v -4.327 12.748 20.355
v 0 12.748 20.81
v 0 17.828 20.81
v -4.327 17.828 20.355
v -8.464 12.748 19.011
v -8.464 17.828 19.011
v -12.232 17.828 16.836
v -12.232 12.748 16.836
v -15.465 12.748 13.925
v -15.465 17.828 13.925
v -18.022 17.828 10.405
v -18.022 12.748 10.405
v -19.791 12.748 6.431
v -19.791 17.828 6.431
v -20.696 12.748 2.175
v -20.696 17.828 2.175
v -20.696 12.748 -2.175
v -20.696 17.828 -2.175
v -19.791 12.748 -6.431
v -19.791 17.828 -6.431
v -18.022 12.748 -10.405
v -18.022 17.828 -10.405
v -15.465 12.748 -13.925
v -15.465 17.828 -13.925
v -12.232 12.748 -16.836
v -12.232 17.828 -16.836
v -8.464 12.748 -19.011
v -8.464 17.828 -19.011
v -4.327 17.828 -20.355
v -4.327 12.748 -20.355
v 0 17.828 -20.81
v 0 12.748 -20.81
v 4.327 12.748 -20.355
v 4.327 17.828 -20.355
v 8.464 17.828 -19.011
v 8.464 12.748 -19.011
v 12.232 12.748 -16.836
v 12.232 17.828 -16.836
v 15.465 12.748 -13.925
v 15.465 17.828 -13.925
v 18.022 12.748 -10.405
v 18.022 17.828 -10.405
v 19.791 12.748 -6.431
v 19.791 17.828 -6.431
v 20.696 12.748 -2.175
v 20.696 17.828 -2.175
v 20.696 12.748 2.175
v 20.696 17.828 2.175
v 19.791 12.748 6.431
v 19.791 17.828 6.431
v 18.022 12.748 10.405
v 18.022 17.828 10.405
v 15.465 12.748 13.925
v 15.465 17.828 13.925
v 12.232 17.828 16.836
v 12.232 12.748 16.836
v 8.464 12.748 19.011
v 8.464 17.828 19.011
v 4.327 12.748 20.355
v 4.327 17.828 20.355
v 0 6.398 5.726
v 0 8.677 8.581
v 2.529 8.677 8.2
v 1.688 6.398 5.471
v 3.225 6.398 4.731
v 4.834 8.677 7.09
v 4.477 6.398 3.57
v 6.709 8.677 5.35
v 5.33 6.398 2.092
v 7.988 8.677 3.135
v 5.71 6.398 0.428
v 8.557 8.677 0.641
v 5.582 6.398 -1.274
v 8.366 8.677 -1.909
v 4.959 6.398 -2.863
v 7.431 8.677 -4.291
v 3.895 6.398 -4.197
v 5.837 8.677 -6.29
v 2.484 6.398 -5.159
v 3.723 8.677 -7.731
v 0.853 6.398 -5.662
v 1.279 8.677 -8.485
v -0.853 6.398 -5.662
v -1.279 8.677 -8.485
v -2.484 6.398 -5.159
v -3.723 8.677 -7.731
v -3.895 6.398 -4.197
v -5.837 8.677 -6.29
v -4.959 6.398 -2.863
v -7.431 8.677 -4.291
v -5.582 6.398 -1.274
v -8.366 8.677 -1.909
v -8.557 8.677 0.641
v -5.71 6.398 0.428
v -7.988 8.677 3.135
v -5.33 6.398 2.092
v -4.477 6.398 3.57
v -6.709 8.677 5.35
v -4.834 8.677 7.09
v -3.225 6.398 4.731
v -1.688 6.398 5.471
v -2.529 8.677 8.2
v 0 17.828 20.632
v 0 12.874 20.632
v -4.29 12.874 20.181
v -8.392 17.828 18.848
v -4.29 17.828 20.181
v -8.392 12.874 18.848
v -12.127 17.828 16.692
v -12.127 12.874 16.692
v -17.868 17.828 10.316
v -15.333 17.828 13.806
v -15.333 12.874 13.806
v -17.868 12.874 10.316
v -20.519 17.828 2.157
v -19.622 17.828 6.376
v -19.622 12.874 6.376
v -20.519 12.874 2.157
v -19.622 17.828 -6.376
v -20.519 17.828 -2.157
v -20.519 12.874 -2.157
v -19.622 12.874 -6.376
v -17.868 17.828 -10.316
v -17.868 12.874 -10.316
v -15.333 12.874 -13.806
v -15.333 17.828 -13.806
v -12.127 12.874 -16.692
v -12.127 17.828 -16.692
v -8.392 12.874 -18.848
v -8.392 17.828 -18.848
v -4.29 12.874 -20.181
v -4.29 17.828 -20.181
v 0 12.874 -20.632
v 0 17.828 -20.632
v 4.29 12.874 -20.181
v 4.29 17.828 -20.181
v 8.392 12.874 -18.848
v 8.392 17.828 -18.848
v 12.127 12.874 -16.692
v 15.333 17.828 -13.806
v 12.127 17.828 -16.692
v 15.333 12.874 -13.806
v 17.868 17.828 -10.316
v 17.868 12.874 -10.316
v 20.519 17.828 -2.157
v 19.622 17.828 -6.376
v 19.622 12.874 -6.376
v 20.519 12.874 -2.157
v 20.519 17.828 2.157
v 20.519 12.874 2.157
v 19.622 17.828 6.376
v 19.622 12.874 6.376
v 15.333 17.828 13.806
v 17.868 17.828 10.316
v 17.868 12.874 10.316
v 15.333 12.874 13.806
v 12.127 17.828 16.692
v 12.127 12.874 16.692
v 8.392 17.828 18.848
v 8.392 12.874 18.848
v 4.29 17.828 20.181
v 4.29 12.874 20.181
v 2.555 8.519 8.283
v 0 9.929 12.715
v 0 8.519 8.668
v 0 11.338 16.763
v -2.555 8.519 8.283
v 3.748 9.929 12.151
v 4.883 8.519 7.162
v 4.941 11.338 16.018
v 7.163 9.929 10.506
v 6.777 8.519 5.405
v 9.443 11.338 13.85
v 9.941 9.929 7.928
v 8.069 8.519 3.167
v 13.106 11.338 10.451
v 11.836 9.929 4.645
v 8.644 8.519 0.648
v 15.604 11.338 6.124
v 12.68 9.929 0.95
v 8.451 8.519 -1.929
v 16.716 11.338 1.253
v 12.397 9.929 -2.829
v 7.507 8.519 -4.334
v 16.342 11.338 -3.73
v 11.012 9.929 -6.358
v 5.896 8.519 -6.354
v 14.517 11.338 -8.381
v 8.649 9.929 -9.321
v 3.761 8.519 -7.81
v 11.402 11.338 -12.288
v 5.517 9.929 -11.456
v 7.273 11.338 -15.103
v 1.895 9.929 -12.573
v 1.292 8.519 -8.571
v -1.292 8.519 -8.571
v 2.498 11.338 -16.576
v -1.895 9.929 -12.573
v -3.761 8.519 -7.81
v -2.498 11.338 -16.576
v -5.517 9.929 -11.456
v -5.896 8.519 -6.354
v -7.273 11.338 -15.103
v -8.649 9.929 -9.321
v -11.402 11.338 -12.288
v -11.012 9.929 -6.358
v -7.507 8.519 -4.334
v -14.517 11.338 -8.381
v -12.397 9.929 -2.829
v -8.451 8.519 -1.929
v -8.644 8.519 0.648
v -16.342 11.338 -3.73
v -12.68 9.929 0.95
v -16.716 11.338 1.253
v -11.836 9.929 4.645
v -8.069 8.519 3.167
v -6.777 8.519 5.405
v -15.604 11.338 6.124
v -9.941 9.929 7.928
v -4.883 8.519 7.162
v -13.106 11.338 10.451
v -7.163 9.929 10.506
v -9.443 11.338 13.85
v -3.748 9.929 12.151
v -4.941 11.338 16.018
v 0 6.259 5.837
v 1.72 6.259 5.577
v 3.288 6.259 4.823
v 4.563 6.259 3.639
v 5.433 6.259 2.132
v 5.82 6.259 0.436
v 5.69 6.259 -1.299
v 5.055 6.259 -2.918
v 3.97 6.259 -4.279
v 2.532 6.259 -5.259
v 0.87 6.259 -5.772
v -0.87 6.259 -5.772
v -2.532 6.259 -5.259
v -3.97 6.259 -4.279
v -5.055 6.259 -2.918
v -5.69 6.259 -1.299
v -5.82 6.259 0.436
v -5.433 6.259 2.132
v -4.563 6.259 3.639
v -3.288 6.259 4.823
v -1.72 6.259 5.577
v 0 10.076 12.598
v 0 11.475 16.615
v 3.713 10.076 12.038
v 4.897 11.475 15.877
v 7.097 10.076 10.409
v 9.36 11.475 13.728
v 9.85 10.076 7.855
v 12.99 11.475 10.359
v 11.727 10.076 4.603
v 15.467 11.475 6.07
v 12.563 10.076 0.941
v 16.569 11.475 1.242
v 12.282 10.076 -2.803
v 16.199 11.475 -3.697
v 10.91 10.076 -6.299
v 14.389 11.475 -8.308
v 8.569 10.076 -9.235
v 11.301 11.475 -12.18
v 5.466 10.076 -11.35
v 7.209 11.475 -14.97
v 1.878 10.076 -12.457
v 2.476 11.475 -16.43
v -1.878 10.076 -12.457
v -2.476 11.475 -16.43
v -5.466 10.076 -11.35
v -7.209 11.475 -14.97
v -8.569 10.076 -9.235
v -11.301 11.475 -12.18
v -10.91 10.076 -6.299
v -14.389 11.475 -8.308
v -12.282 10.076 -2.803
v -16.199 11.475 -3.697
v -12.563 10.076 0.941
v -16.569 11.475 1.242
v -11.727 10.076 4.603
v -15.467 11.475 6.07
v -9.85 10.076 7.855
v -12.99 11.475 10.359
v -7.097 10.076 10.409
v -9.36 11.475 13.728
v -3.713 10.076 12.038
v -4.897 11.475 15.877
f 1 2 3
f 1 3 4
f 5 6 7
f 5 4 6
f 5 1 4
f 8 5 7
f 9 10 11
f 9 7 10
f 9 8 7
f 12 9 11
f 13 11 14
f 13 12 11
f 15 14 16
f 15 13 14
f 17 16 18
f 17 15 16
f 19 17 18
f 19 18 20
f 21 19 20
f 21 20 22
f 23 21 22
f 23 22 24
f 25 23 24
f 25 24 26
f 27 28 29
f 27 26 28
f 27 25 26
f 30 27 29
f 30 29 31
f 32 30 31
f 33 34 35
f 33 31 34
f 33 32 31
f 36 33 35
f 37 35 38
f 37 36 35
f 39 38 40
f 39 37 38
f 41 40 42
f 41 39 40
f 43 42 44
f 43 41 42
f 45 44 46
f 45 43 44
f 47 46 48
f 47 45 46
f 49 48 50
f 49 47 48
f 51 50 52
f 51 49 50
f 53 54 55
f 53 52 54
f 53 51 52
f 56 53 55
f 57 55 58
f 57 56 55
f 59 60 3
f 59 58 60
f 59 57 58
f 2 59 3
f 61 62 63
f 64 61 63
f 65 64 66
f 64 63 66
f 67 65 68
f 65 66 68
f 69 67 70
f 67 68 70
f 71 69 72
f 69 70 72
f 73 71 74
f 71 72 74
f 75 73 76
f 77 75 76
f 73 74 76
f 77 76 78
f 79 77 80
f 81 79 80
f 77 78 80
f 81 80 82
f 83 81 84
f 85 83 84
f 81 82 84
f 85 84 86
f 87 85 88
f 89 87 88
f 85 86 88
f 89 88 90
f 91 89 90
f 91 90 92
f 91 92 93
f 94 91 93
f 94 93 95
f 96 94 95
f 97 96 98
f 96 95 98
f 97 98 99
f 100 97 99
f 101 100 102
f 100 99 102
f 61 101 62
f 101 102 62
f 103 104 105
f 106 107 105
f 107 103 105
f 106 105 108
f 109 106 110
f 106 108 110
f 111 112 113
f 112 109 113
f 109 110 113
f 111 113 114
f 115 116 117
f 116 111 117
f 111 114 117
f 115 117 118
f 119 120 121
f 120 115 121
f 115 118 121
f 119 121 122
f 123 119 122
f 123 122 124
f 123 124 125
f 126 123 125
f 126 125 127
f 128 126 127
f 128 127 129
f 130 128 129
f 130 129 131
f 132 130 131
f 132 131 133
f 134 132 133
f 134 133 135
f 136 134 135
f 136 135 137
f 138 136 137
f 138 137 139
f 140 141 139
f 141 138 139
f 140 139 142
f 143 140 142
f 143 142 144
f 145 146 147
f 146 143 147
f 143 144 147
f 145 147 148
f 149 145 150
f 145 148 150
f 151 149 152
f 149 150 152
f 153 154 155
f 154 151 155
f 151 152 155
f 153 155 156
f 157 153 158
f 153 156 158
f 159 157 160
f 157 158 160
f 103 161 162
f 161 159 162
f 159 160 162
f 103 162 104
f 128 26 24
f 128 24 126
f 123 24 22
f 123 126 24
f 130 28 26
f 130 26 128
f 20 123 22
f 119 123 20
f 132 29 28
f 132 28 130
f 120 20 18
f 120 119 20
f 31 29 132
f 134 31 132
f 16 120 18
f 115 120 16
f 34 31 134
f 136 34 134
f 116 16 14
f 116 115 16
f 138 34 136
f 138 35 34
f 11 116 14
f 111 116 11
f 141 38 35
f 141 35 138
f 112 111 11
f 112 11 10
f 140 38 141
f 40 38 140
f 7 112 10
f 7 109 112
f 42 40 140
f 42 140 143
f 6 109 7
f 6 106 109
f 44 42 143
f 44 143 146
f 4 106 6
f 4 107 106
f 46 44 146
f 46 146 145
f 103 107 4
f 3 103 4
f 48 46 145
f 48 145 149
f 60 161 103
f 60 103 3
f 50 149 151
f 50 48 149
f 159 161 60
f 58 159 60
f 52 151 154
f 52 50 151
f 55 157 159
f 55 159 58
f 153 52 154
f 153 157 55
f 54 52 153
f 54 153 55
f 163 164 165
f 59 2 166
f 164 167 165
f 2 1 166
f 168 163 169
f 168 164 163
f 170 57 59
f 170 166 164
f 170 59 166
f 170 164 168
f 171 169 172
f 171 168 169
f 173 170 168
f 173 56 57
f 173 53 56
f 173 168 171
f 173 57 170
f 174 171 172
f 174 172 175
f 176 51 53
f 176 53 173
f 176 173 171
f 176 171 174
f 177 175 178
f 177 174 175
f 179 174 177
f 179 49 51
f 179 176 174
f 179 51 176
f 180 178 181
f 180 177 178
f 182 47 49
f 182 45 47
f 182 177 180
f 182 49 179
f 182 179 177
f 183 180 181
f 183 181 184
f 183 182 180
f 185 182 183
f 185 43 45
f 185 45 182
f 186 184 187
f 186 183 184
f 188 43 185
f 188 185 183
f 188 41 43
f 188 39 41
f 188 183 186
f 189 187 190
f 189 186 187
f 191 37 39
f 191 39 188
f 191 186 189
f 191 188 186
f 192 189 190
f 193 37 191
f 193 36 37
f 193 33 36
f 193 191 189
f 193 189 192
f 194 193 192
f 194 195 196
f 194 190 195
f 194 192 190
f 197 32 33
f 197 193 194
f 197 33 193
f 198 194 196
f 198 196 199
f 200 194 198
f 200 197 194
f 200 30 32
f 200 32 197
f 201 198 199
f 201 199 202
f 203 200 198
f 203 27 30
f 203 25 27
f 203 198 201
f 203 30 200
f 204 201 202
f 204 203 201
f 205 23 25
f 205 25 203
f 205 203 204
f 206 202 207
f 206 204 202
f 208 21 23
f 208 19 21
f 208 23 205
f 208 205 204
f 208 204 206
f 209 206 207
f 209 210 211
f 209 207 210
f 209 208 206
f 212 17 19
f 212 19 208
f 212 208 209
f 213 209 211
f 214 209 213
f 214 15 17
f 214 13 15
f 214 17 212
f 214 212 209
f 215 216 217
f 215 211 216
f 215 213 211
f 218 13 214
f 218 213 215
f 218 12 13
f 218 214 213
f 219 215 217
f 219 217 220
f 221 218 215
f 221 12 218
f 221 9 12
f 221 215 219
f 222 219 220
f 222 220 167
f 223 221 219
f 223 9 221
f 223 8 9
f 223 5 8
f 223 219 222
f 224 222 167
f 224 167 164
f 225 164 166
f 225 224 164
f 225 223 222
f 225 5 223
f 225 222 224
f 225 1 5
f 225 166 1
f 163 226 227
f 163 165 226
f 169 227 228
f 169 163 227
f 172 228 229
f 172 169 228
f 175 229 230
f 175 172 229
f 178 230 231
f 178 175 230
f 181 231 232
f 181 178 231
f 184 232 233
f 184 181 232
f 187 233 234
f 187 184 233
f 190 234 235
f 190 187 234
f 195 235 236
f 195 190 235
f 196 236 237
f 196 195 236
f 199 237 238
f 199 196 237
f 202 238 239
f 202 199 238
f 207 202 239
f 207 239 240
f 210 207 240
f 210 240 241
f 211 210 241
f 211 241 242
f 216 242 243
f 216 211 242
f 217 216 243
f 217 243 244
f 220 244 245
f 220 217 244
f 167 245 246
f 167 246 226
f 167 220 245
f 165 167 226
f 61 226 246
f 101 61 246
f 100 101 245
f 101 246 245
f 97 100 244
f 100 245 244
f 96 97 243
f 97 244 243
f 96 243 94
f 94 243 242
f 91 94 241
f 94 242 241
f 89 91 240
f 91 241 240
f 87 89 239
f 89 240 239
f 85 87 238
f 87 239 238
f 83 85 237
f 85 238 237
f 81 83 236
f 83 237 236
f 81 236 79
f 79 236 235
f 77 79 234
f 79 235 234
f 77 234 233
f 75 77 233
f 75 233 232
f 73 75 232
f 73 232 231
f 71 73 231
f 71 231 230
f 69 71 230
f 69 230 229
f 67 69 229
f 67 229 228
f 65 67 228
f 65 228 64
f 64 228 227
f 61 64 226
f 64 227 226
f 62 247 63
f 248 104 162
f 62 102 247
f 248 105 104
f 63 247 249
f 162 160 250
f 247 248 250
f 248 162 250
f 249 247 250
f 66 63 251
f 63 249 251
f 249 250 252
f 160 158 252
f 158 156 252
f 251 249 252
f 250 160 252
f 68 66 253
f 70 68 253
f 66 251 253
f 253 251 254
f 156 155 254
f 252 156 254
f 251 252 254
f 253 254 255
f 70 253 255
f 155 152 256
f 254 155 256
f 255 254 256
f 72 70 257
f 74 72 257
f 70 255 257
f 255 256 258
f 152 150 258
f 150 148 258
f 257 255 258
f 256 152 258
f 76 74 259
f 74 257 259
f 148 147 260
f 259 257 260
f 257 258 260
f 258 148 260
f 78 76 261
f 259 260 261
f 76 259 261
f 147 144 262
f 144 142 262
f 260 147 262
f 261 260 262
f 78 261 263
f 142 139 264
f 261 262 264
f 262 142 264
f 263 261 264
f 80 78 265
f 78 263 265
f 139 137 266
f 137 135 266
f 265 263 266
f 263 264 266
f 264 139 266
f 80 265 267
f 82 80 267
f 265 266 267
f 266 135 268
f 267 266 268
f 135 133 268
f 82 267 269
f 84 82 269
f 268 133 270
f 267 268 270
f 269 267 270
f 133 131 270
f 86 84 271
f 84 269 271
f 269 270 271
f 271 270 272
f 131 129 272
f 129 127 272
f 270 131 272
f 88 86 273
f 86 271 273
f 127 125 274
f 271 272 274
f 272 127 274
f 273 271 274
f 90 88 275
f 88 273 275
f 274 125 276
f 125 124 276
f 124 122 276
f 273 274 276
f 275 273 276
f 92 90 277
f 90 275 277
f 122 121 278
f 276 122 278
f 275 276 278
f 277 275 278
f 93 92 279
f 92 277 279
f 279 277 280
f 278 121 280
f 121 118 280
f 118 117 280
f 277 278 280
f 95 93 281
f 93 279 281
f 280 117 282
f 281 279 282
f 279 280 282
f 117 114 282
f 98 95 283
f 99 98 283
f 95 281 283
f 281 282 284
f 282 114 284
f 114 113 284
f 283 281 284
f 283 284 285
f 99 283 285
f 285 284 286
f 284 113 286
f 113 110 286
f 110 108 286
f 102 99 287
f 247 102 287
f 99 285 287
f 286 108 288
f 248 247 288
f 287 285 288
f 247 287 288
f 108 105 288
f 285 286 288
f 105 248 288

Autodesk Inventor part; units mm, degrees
ref_plane "YZ Plane" through (0, 0, 0) normal (1, 0, 0) x (0, 1, 0)
ref_plane "XZ Plane" through (0, 0, 0) normal (0, 1, 0) x (-1, 0, 0)
ref_plane "XY Plane" through (0, 0, 0) normal (0, 0, 1) x (1, 0, 0)
sketch "Sketch1" plane through (0, 0, 0) normal (1, 0, 0) x (0, 1, 0)
  line L0 (-5.1799, 0) -> (31.0792, 0) construction
  line L1 (0, -33.1988) -> (0, 40.25) construction
  line L2 (0, 0) -> (13, 9.7962) construction
  line L3 (0, 0) -> (13, -9.7962) construction
  line L4 (3.35, 2.6) -> (0.75, 2.6) construction
  line L5 (0.75, 2.6) -> (0.75, -2.6) construction
  line L6 (0.75, -2.6) -> (3.35, -2.6) construction
  line L7 (3.35, -2.6) -> (3.35, 2.6) construction
  line L8 (4.874, 11.4005) -> (4.874, -12.8161) construction
  line L9 (7.922, 11.2583) -> (7.922, -12.1988) construction
  circle A0 centre (6.398, 25.4) radius 3.175 construction
  line L10 (12.748, 29.7573) -> (12.748, -6.0773) construction
  line L11 (13, -8.155) -> (13, 15.6322) construction
  line L12 (12.748, 20.81) -> (8.422, 8.3886)
  line L13 (13, 11.8384) -> (4.874, 5.715) construction
  line L14 (12.9363, 20.81) -> (12.8744, 20.6322) construction
  line L15 (12.748, 20.81) -> (21.6933, 20.81) construction
  line L16 (12.9363, 20.81) -> (12.748, 20.81)
  line L17 (8.6773, 8.581) -> (8.422, 8.3886)
  line L18 (0, 3.81) -> (0, -3.81) construction
  line L19 (0, 3.81) -> (13, 13.6062) construction
  line L20 (13, 15.6322) -> (25.8994, 15.6322) construction
  line L21 (17.828, 20.81) -> (17.828, 20.6322)
  line L22 (17.828, 20.6322) -> (12.8744, 20.6322)
  line L23 (17.828, 20.81) -> (12.9363, 20.81)
  line L24 (12.8744, 20.6322) -> (8.6773, 8.581)
  line L25 (4.874, 5.715) -> (7.922, 8.763) construction
  line L26 (5, -22.7061) -> (5, -16.8713)
  line L27 (8.422, 8.3886) -> (8.422, 7.251) construction
  line L28 (8.422, 7.251) -> (3.35, 3.429) construction
  line L29 (6.398, 5.7258) -> (12.748, 13.6802) construction
  dimension "d0" = 37
  dimension "d1" = 13
  dimension "d2" = 2.6
  dimension "d3" = 5.2
  dimension "d4" = 0.75
  dimension "d5" = 1.524
  dimension "d6" = 3.048
  dimension "d7" = 6.35
  dimension "d8" = 1.524
  dimension "d9" = 25.4
  dimension "d10" = 3.175
  dimension "cone1_major_rad" = 20.81
  dimension "d13" = 0.5
  dimension "d15" = 5.715
  dimension "d17" = 0.1778
  dimension "d19" = 7.62
  dimension "d21" = 5.1778
  dimension "d22" = 0.1778
  dimension "ring_hieght" = 5.08
  dimension "cone1_minor_rad" = 8.3886
  dimension "cone1_height" = 4.326
  dimension "d26" = 45
  dimension "d27" = 5
  dimension "d29" = 2.286
  dimension "d30" = 7.251
  dimension "d31" = 13.6802
  dimension "cone2_minor_rad" = 5.7258
  dimension "d33" = 6.35
  dimension "d34" = 8.581
  dimension "cone2_hieght" = 2.024
revolve "Revolution1" add sketch "Sketch1" angle 360 about axis through (0, -10, 0) along (0, 1, 0)
sketch "Sketch2" plane through (0, 0, 0) normal (1, 0, 0) x (0, 1, 0)
  line L0 (8.6773, 8.581) -> (8.422, 8.3886) projected
  line L1 (0, 0) -> (13, 9.7962) construction
  line L2 (8.422, 8.3886) -> (8.422, 6.3464)
  line L3 (8.6773, 8.581) -> (8.6773, 6.5388)
  line L4 (8.422, 6.3464) -> (8.6773, 6.5388)
  line L5 (-5.1799, 0) -> (31.0792, 0) construction
revolve "Revolution2" [suppressed]
sketch "Sketch4" plane through (0, 0, 0) normal (1, 0, 0) x (0, 1, 0)
  line L0 (6.398, 5.7258) -> (12.748, 13.6802) construction
  line L1 (8.6773, 8.581) -> (6.398, 5.7258)
  line L2 (8.5383, 8.6919) -> (6.259, 5.8368)
  line L3 (6.398, 5.7258) -> (6.259, 5.8368)
  line L4 (8.6773, 8.581) -> (8.5383, 8.6919)
  line L5 (-5.1799, 0) -> (31.0792, 0) construction
  point P0 (0, 0)
  dimension "d36" = 0.1778
revolve "Revolution3" add sketch "Sketch4" angle 360 about axis through (0, -5.1799, 0) along (0, 1, 0)
equation "\"d8\" = 0.5 * d6"
equation "\"cone1_major_rad\" = 0.5 * main_aperture_diameter"
equation "\"d15\" = 0.5 * headplate_aperture_diameter"
equation "\"d19\" = fov_diameter"
equation "\"d21\" = 0.5 * EO_20x_diameter - 0.5 * E0_20x_front_aperture_diameter + d17"
equation "\"d22\" = d17"
equation "\"d36\" = d17"
equation "\"BendRadius\" = Thickness"
equation "\"BendReliefWidth\" = Thickness"
equation "\"BendReliefDepth\" = 0.5 * Thickness"
equation "\"CornerReliefSize\" = 4 * Thickness"
equation "\"MinimumRemnant\" = 2 * Thickness"
equation "\"TransitionRadius\" = BendRadius"
equation "\"JacobiRadiusSize\" = Thickness"
equation "\"GapSize\" = Thickness"
equation "\"main_aperture_diameter\" = 41.62"
equation "\"headplate_aperture_diameter\" = 11.43"
equation "\"fov_diameter\" = 7.62"
equation "\"EO_20x_diameter\" = 33.999932"
equation "\"E0_20x_front_aperture_diameter\" = 24.000003"
equation "\"Thickness\" = 3.048"
properties part number "objective_shield_2" material "Brass, Soft Yellow"
